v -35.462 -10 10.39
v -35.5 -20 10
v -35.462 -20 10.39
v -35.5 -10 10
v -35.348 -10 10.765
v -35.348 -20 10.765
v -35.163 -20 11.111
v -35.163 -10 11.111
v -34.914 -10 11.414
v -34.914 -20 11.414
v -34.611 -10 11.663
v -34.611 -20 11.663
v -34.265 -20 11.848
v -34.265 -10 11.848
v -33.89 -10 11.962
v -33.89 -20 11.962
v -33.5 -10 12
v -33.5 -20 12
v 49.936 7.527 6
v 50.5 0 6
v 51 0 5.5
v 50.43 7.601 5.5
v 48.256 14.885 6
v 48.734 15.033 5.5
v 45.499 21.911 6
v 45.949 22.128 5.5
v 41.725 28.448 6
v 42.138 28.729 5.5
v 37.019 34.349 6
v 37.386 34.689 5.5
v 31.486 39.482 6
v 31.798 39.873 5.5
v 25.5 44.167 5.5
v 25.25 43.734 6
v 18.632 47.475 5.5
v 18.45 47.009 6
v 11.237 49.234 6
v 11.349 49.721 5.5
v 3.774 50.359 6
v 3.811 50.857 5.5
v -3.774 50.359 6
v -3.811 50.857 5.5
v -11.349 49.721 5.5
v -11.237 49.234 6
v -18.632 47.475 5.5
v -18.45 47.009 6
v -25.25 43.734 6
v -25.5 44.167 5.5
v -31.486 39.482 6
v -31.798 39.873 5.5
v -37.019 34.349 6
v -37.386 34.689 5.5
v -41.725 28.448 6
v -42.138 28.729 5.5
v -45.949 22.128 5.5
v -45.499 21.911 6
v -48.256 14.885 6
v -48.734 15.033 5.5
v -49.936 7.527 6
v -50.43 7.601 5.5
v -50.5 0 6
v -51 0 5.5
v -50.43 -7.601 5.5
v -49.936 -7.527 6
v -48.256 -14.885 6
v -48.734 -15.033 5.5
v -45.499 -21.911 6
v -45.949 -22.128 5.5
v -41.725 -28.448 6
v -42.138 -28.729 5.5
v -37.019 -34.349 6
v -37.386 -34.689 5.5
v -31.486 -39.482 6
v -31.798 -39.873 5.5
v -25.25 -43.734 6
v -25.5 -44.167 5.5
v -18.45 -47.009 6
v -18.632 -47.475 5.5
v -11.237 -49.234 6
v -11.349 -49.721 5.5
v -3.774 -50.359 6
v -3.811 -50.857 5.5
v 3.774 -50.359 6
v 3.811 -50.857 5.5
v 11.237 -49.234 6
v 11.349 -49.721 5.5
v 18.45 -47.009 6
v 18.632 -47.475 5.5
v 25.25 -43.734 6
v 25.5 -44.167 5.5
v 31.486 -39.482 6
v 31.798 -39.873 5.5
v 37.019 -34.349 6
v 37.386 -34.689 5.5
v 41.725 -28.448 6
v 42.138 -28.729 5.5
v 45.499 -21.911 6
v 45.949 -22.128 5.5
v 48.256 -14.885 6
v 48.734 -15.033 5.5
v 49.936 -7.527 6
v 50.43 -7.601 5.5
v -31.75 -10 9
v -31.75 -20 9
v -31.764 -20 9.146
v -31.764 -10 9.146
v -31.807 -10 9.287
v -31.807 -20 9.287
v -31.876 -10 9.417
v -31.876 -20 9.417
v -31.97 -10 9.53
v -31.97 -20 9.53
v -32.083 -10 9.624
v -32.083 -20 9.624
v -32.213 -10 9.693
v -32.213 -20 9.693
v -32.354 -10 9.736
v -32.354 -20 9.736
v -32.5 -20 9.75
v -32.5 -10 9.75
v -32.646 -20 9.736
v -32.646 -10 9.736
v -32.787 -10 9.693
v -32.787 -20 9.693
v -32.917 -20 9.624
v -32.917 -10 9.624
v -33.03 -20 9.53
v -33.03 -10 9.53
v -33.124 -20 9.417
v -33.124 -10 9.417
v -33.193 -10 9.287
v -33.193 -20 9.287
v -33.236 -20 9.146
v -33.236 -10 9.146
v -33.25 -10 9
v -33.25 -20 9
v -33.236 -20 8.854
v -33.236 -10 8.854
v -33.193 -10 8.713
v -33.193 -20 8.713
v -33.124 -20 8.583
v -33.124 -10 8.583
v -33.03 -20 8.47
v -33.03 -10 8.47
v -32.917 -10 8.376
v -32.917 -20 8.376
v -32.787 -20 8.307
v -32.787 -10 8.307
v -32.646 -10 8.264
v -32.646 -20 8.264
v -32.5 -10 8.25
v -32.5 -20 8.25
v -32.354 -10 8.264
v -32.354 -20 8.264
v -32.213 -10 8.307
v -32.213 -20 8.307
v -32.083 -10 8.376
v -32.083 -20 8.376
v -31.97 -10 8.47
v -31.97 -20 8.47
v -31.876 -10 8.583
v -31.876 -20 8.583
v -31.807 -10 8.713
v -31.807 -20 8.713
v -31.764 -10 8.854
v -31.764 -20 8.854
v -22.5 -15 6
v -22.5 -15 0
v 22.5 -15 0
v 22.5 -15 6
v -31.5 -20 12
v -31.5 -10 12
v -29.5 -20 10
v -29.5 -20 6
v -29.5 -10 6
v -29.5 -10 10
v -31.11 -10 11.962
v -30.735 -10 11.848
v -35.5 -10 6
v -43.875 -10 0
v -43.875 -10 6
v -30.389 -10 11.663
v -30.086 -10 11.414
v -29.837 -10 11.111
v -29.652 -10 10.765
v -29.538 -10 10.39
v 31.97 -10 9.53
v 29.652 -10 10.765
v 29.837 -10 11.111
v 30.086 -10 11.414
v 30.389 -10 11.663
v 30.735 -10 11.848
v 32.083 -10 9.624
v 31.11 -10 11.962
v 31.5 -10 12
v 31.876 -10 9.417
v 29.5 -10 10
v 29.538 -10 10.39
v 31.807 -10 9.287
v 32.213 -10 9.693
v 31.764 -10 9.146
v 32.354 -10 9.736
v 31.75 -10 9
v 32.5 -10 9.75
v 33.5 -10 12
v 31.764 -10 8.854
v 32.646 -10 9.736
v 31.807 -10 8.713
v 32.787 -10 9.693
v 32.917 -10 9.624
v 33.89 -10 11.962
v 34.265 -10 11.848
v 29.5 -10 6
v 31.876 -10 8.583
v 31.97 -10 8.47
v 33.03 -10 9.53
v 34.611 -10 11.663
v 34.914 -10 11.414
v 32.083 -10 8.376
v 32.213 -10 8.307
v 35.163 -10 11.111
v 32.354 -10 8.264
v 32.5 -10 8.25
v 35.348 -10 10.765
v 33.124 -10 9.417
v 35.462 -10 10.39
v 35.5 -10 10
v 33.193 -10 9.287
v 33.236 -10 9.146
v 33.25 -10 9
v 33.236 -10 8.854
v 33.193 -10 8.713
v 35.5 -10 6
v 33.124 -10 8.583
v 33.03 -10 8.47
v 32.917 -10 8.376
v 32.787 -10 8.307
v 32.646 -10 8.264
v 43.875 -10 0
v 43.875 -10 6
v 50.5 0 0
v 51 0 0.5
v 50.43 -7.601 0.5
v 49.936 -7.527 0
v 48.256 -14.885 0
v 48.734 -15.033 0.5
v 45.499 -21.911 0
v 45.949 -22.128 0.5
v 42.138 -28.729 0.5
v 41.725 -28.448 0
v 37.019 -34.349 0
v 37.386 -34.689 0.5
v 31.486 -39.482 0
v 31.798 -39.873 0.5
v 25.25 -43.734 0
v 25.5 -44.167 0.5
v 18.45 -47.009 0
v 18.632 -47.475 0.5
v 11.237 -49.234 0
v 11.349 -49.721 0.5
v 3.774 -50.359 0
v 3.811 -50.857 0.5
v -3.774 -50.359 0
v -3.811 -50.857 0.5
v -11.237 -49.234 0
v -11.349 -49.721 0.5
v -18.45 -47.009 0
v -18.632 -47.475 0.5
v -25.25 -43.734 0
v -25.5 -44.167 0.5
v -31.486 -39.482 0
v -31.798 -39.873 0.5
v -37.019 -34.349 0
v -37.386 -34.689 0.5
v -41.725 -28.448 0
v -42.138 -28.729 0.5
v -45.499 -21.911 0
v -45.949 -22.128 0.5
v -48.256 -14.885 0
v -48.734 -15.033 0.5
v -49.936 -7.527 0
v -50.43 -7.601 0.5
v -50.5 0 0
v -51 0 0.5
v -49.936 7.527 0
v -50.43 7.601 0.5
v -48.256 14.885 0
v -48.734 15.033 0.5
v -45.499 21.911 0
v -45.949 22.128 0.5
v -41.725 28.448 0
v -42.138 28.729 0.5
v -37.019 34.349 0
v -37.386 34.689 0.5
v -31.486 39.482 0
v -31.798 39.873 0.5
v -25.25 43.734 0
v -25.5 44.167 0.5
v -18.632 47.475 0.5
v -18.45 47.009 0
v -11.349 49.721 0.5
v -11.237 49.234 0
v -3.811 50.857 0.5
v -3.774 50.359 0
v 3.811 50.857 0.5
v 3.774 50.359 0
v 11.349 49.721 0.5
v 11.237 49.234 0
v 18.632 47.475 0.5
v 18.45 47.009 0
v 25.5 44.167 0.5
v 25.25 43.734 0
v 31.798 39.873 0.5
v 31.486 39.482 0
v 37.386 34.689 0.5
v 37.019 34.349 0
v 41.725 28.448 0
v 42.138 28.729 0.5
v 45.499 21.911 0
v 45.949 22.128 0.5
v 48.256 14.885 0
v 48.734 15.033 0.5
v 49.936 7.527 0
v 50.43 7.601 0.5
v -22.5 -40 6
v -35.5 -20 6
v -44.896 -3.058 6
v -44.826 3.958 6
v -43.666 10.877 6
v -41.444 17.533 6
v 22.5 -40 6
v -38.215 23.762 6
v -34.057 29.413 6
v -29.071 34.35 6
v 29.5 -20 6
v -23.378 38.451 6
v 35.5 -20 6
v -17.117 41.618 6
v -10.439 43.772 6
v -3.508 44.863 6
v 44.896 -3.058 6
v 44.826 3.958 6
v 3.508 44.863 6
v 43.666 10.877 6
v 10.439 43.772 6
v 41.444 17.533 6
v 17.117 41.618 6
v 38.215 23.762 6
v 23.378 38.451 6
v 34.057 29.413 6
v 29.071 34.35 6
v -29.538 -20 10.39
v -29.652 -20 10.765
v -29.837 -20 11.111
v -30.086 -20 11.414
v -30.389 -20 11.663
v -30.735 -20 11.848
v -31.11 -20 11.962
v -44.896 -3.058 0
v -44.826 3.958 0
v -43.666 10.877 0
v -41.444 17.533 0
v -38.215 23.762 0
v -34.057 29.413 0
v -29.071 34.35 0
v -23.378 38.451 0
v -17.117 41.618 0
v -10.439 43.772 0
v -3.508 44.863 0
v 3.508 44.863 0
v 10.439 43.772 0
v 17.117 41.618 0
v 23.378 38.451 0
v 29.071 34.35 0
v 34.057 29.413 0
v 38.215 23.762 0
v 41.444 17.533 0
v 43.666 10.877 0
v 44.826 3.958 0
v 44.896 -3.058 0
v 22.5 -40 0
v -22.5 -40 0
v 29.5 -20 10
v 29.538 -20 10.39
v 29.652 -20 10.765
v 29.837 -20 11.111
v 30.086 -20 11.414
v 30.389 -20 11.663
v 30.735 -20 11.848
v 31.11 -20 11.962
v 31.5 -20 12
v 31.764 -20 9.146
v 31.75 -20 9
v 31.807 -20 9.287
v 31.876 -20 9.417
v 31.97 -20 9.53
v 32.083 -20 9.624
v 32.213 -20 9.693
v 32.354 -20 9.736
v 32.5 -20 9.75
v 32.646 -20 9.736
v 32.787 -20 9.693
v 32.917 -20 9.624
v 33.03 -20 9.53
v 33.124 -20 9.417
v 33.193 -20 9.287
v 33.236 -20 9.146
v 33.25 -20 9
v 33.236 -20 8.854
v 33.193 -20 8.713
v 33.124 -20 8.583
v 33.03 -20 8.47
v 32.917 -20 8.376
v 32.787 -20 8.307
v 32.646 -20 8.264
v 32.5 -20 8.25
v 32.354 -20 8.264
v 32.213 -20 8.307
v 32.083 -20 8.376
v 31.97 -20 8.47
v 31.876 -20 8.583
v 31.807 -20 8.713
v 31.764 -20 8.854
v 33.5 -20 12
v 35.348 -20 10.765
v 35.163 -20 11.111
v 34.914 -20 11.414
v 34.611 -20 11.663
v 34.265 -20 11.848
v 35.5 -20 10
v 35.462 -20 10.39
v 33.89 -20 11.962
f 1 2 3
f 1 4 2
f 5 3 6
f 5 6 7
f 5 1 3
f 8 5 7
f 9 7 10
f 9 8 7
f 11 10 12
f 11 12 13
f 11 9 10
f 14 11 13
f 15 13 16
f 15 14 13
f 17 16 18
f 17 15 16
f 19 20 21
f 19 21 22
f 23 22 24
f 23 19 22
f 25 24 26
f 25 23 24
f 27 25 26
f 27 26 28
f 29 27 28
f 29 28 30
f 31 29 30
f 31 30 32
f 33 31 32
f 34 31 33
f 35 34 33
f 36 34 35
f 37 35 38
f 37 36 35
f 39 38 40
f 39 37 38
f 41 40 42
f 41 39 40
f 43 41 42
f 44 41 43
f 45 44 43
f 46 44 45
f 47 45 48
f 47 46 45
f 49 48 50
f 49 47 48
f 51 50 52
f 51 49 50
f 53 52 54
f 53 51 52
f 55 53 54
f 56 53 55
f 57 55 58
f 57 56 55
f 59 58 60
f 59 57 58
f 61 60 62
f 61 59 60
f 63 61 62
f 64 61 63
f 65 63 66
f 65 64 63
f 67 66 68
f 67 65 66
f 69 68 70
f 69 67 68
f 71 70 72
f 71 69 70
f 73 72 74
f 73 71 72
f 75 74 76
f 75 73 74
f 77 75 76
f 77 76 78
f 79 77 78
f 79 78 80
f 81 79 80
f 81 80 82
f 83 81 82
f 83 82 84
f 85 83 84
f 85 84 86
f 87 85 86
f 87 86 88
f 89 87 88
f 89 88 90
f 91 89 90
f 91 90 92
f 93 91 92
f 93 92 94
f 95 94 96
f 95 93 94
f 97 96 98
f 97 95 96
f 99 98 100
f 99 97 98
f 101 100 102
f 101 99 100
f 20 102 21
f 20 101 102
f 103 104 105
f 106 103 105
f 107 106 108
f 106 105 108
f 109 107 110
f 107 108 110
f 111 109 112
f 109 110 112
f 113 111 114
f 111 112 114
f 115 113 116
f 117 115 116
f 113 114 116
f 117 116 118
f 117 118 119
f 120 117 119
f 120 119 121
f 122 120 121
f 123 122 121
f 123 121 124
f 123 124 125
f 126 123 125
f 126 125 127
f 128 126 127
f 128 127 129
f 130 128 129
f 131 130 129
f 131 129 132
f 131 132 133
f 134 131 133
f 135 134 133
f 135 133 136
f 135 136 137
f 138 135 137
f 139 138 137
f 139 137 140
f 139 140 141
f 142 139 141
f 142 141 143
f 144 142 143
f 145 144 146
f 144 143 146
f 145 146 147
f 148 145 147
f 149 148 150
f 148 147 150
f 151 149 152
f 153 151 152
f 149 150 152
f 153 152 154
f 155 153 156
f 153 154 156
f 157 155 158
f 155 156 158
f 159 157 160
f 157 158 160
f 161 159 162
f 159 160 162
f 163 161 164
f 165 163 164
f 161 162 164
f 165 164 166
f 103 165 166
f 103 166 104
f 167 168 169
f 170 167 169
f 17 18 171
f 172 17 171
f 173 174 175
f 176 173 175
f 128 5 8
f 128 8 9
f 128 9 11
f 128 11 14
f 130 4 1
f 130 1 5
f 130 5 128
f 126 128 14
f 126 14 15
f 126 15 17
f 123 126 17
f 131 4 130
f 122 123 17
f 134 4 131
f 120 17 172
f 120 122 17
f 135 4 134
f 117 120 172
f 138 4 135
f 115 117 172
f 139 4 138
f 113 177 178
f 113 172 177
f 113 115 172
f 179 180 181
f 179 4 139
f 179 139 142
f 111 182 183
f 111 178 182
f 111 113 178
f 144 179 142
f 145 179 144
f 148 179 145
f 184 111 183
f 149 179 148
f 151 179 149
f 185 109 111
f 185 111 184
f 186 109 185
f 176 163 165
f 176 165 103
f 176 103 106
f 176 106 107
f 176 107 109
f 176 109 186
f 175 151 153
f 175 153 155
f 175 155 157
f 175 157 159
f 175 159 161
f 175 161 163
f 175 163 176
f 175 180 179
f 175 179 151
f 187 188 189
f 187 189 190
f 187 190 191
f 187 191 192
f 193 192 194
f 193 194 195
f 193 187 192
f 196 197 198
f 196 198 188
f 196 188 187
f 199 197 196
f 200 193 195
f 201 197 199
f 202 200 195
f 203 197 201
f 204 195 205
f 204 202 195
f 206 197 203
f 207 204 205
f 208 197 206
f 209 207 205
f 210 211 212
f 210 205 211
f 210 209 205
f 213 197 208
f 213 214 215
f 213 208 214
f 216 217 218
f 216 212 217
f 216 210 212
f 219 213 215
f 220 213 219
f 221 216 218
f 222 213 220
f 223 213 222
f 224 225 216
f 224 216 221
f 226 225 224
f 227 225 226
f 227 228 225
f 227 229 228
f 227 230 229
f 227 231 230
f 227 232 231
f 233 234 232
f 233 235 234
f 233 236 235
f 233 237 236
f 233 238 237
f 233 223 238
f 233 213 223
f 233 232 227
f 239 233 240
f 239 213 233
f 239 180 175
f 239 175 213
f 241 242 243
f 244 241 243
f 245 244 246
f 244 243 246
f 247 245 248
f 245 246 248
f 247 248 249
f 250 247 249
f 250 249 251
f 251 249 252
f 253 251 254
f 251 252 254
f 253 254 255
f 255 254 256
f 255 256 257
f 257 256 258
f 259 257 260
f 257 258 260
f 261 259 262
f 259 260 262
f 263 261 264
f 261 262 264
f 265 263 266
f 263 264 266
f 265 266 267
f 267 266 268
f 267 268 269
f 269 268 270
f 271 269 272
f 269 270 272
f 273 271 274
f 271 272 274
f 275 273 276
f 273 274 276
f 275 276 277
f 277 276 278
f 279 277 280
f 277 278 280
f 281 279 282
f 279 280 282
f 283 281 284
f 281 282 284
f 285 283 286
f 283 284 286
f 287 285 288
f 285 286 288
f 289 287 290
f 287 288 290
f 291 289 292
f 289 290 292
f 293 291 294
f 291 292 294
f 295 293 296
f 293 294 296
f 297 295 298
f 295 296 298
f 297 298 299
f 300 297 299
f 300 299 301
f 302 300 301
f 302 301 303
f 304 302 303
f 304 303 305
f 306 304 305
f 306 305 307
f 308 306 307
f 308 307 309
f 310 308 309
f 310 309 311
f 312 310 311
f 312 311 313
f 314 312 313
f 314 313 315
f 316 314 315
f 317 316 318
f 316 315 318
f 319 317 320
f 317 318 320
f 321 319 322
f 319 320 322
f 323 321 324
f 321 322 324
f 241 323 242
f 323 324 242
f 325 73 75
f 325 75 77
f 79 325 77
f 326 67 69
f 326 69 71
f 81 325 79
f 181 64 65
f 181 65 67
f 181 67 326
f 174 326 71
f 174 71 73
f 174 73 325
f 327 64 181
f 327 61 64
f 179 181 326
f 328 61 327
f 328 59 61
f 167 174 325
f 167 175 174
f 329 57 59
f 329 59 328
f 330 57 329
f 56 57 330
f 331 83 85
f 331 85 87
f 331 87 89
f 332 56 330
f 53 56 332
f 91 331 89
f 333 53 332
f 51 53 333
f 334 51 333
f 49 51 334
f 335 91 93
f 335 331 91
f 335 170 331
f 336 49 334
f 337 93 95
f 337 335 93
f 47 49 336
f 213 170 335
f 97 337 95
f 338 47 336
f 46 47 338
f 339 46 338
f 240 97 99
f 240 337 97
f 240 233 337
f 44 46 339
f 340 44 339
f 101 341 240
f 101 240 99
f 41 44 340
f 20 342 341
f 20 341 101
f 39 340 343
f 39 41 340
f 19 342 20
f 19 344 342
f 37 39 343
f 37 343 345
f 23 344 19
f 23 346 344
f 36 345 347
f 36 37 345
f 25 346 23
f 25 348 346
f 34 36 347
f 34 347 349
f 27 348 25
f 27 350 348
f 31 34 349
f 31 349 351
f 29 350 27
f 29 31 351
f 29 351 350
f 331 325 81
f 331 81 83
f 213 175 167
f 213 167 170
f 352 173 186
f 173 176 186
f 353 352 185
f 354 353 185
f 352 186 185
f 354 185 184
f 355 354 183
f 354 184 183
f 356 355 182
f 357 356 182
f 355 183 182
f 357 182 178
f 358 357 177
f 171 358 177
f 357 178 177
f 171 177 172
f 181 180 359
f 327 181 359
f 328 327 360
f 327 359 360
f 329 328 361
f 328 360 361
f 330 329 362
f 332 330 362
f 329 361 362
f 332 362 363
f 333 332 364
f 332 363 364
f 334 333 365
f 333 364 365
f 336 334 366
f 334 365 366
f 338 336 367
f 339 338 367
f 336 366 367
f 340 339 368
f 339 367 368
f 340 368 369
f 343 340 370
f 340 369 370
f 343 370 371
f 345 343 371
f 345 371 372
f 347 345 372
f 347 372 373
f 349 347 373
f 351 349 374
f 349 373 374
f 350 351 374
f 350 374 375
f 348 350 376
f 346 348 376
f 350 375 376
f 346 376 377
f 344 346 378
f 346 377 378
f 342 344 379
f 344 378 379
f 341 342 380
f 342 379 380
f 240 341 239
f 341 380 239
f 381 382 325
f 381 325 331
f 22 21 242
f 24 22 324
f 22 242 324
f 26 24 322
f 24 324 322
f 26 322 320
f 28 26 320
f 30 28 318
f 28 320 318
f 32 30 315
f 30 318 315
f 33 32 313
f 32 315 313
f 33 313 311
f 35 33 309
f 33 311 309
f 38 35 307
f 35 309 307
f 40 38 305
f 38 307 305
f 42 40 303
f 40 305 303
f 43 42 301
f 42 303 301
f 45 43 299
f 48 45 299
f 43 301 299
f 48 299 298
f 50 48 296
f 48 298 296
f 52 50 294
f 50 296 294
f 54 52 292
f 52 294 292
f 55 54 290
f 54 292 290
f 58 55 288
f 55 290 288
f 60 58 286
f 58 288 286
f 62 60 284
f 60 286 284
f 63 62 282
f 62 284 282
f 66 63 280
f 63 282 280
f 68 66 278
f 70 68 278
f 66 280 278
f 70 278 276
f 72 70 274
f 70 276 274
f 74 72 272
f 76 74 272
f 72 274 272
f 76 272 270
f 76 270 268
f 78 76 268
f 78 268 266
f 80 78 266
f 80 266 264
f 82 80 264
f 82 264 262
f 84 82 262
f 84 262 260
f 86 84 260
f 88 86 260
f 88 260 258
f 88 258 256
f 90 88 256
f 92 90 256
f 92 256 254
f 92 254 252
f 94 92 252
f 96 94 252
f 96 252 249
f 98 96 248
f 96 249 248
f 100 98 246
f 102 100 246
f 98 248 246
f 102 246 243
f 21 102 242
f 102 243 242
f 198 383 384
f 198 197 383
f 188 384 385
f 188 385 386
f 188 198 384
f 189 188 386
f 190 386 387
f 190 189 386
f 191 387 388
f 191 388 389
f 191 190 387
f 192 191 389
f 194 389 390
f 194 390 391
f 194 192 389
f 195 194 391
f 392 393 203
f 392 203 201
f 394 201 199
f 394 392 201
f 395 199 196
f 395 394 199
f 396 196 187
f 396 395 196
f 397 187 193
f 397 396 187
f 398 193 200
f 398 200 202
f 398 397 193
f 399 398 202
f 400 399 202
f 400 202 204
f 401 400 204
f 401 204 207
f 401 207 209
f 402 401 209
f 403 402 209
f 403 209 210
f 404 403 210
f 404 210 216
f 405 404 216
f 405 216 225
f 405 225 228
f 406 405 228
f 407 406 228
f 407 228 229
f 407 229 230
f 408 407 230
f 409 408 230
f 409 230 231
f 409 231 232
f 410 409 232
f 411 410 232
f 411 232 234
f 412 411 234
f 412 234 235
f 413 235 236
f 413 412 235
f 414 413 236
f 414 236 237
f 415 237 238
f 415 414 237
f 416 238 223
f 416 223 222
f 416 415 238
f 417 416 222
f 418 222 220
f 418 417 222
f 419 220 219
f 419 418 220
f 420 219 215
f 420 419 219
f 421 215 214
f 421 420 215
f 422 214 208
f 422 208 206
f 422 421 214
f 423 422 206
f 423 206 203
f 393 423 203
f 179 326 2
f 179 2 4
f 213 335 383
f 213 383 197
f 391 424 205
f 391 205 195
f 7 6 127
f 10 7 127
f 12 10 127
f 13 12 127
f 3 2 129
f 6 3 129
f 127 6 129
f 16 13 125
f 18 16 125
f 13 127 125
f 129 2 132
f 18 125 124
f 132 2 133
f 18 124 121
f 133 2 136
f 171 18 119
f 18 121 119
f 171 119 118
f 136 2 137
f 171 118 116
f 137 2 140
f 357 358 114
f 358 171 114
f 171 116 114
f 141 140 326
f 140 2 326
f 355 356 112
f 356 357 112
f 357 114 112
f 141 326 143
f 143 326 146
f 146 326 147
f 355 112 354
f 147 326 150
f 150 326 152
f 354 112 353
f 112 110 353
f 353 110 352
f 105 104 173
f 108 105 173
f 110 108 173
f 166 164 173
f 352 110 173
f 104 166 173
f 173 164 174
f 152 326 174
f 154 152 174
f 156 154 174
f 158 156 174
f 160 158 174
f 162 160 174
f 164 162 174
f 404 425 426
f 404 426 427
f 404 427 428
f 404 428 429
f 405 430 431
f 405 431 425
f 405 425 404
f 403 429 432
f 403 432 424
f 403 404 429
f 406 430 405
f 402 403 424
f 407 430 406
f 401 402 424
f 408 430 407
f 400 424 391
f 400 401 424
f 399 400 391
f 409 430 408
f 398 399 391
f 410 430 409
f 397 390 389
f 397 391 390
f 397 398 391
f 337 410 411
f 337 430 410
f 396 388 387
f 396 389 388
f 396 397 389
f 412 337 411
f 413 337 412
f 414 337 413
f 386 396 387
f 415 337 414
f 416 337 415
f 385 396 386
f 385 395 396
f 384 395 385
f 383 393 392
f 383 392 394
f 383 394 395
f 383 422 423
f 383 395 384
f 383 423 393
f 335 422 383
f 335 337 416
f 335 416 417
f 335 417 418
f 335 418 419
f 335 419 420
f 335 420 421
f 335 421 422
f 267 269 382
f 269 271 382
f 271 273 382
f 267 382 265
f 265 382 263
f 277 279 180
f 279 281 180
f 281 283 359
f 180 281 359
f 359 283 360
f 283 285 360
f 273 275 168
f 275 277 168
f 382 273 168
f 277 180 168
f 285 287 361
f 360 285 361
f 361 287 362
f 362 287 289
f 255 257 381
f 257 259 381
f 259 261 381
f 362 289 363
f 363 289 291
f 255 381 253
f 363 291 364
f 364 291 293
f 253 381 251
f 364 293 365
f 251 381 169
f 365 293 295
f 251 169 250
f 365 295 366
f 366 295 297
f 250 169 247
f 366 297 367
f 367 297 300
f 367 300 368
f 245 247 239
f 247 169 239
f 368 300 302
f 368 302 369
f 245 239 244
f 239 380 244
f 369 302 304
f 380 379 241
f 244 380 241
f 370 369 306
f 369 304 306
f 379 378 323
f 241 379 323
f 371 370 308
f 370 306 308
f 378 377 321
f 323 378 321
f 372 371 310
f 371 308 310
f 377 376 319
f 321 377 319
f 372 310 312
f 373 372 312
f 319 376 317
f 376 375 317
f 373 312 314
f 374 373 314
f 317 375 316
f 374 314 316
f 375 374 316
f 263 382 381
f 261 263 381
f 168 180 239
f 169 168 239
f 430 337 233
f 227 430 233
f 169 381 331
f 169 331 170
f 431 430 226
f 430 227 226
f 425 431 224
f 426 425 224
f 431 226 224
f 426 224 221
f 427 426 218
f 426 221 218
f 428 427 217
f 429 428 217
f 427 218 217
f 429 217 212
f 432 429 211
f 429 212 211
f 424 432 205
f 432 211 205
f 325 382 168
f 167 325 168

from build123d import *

# Parameters (mm, degrees)
F0_R     = 51
F0_W     = 45
F0_H     = 25
F1_DEPTH = 6
F2_W     = 6
F2_H     = 10
F3_DEPTH = 6
F5_R     = 2
F6_D     = 1.5
F8_SIZE  = 0.5


with BuildPart() as f1:
    # F0 (on Top) → F1 (new body)
    with BuildSketch(Plane.XY):
        Circle(F0_R)
        with Locations((0, -27.5)):
            Rectangle(F0_W, F0_H, mode=Mode.SUBTRACT)
        with BuildLine():
            Line((43.874821937, -10), (-43.874821937, -10))
            ThreePointArc((-43.874821937, -10), (0, 45), (43.874821937, -10))
        make_face(mode=Mode.SUBTRACT)
    extrude(amount=F1_DEPTH)

    # F2 (on face) → F3 (join)
    with BuildSketch(Plane.XY.offset(6)):
        with Locations((-32.5, -15)):
            Rectangle(F2_W, F2_H)
    extrude(amount=F3_DEPTH)

    # F5
    f5_edges = [f1.edges().sort_by_distance(p)[0] for p in [
        (-29.5, -15, 12),
        (-35.5, -15, 12),
    ]]
    fillet(f5_edges, radius=F5_R)

    # F6 (through all)
    with Locations(Plane(origin=(0, -10, 0), x_dir=(-1, 0, 0), z_dir=(0, 1, 0))):
        with Locations((32.5, 9)):
            Hole(F6_D / 2)

    # F7: F1 across plane


with BuildPart() as f1_1:
    add(f1.part)
    add(f1.part.mirror(Plane.YZ))

    # F8
    f8_edges = [f1_1.edges().sort_by_distance(p)[0] for p in [
        (-51, 0, 6),
        (-51, 0, 0),
    ]]
    chamfer(f8_edges, length=F8_SIZE)


solid = f1_1.part
